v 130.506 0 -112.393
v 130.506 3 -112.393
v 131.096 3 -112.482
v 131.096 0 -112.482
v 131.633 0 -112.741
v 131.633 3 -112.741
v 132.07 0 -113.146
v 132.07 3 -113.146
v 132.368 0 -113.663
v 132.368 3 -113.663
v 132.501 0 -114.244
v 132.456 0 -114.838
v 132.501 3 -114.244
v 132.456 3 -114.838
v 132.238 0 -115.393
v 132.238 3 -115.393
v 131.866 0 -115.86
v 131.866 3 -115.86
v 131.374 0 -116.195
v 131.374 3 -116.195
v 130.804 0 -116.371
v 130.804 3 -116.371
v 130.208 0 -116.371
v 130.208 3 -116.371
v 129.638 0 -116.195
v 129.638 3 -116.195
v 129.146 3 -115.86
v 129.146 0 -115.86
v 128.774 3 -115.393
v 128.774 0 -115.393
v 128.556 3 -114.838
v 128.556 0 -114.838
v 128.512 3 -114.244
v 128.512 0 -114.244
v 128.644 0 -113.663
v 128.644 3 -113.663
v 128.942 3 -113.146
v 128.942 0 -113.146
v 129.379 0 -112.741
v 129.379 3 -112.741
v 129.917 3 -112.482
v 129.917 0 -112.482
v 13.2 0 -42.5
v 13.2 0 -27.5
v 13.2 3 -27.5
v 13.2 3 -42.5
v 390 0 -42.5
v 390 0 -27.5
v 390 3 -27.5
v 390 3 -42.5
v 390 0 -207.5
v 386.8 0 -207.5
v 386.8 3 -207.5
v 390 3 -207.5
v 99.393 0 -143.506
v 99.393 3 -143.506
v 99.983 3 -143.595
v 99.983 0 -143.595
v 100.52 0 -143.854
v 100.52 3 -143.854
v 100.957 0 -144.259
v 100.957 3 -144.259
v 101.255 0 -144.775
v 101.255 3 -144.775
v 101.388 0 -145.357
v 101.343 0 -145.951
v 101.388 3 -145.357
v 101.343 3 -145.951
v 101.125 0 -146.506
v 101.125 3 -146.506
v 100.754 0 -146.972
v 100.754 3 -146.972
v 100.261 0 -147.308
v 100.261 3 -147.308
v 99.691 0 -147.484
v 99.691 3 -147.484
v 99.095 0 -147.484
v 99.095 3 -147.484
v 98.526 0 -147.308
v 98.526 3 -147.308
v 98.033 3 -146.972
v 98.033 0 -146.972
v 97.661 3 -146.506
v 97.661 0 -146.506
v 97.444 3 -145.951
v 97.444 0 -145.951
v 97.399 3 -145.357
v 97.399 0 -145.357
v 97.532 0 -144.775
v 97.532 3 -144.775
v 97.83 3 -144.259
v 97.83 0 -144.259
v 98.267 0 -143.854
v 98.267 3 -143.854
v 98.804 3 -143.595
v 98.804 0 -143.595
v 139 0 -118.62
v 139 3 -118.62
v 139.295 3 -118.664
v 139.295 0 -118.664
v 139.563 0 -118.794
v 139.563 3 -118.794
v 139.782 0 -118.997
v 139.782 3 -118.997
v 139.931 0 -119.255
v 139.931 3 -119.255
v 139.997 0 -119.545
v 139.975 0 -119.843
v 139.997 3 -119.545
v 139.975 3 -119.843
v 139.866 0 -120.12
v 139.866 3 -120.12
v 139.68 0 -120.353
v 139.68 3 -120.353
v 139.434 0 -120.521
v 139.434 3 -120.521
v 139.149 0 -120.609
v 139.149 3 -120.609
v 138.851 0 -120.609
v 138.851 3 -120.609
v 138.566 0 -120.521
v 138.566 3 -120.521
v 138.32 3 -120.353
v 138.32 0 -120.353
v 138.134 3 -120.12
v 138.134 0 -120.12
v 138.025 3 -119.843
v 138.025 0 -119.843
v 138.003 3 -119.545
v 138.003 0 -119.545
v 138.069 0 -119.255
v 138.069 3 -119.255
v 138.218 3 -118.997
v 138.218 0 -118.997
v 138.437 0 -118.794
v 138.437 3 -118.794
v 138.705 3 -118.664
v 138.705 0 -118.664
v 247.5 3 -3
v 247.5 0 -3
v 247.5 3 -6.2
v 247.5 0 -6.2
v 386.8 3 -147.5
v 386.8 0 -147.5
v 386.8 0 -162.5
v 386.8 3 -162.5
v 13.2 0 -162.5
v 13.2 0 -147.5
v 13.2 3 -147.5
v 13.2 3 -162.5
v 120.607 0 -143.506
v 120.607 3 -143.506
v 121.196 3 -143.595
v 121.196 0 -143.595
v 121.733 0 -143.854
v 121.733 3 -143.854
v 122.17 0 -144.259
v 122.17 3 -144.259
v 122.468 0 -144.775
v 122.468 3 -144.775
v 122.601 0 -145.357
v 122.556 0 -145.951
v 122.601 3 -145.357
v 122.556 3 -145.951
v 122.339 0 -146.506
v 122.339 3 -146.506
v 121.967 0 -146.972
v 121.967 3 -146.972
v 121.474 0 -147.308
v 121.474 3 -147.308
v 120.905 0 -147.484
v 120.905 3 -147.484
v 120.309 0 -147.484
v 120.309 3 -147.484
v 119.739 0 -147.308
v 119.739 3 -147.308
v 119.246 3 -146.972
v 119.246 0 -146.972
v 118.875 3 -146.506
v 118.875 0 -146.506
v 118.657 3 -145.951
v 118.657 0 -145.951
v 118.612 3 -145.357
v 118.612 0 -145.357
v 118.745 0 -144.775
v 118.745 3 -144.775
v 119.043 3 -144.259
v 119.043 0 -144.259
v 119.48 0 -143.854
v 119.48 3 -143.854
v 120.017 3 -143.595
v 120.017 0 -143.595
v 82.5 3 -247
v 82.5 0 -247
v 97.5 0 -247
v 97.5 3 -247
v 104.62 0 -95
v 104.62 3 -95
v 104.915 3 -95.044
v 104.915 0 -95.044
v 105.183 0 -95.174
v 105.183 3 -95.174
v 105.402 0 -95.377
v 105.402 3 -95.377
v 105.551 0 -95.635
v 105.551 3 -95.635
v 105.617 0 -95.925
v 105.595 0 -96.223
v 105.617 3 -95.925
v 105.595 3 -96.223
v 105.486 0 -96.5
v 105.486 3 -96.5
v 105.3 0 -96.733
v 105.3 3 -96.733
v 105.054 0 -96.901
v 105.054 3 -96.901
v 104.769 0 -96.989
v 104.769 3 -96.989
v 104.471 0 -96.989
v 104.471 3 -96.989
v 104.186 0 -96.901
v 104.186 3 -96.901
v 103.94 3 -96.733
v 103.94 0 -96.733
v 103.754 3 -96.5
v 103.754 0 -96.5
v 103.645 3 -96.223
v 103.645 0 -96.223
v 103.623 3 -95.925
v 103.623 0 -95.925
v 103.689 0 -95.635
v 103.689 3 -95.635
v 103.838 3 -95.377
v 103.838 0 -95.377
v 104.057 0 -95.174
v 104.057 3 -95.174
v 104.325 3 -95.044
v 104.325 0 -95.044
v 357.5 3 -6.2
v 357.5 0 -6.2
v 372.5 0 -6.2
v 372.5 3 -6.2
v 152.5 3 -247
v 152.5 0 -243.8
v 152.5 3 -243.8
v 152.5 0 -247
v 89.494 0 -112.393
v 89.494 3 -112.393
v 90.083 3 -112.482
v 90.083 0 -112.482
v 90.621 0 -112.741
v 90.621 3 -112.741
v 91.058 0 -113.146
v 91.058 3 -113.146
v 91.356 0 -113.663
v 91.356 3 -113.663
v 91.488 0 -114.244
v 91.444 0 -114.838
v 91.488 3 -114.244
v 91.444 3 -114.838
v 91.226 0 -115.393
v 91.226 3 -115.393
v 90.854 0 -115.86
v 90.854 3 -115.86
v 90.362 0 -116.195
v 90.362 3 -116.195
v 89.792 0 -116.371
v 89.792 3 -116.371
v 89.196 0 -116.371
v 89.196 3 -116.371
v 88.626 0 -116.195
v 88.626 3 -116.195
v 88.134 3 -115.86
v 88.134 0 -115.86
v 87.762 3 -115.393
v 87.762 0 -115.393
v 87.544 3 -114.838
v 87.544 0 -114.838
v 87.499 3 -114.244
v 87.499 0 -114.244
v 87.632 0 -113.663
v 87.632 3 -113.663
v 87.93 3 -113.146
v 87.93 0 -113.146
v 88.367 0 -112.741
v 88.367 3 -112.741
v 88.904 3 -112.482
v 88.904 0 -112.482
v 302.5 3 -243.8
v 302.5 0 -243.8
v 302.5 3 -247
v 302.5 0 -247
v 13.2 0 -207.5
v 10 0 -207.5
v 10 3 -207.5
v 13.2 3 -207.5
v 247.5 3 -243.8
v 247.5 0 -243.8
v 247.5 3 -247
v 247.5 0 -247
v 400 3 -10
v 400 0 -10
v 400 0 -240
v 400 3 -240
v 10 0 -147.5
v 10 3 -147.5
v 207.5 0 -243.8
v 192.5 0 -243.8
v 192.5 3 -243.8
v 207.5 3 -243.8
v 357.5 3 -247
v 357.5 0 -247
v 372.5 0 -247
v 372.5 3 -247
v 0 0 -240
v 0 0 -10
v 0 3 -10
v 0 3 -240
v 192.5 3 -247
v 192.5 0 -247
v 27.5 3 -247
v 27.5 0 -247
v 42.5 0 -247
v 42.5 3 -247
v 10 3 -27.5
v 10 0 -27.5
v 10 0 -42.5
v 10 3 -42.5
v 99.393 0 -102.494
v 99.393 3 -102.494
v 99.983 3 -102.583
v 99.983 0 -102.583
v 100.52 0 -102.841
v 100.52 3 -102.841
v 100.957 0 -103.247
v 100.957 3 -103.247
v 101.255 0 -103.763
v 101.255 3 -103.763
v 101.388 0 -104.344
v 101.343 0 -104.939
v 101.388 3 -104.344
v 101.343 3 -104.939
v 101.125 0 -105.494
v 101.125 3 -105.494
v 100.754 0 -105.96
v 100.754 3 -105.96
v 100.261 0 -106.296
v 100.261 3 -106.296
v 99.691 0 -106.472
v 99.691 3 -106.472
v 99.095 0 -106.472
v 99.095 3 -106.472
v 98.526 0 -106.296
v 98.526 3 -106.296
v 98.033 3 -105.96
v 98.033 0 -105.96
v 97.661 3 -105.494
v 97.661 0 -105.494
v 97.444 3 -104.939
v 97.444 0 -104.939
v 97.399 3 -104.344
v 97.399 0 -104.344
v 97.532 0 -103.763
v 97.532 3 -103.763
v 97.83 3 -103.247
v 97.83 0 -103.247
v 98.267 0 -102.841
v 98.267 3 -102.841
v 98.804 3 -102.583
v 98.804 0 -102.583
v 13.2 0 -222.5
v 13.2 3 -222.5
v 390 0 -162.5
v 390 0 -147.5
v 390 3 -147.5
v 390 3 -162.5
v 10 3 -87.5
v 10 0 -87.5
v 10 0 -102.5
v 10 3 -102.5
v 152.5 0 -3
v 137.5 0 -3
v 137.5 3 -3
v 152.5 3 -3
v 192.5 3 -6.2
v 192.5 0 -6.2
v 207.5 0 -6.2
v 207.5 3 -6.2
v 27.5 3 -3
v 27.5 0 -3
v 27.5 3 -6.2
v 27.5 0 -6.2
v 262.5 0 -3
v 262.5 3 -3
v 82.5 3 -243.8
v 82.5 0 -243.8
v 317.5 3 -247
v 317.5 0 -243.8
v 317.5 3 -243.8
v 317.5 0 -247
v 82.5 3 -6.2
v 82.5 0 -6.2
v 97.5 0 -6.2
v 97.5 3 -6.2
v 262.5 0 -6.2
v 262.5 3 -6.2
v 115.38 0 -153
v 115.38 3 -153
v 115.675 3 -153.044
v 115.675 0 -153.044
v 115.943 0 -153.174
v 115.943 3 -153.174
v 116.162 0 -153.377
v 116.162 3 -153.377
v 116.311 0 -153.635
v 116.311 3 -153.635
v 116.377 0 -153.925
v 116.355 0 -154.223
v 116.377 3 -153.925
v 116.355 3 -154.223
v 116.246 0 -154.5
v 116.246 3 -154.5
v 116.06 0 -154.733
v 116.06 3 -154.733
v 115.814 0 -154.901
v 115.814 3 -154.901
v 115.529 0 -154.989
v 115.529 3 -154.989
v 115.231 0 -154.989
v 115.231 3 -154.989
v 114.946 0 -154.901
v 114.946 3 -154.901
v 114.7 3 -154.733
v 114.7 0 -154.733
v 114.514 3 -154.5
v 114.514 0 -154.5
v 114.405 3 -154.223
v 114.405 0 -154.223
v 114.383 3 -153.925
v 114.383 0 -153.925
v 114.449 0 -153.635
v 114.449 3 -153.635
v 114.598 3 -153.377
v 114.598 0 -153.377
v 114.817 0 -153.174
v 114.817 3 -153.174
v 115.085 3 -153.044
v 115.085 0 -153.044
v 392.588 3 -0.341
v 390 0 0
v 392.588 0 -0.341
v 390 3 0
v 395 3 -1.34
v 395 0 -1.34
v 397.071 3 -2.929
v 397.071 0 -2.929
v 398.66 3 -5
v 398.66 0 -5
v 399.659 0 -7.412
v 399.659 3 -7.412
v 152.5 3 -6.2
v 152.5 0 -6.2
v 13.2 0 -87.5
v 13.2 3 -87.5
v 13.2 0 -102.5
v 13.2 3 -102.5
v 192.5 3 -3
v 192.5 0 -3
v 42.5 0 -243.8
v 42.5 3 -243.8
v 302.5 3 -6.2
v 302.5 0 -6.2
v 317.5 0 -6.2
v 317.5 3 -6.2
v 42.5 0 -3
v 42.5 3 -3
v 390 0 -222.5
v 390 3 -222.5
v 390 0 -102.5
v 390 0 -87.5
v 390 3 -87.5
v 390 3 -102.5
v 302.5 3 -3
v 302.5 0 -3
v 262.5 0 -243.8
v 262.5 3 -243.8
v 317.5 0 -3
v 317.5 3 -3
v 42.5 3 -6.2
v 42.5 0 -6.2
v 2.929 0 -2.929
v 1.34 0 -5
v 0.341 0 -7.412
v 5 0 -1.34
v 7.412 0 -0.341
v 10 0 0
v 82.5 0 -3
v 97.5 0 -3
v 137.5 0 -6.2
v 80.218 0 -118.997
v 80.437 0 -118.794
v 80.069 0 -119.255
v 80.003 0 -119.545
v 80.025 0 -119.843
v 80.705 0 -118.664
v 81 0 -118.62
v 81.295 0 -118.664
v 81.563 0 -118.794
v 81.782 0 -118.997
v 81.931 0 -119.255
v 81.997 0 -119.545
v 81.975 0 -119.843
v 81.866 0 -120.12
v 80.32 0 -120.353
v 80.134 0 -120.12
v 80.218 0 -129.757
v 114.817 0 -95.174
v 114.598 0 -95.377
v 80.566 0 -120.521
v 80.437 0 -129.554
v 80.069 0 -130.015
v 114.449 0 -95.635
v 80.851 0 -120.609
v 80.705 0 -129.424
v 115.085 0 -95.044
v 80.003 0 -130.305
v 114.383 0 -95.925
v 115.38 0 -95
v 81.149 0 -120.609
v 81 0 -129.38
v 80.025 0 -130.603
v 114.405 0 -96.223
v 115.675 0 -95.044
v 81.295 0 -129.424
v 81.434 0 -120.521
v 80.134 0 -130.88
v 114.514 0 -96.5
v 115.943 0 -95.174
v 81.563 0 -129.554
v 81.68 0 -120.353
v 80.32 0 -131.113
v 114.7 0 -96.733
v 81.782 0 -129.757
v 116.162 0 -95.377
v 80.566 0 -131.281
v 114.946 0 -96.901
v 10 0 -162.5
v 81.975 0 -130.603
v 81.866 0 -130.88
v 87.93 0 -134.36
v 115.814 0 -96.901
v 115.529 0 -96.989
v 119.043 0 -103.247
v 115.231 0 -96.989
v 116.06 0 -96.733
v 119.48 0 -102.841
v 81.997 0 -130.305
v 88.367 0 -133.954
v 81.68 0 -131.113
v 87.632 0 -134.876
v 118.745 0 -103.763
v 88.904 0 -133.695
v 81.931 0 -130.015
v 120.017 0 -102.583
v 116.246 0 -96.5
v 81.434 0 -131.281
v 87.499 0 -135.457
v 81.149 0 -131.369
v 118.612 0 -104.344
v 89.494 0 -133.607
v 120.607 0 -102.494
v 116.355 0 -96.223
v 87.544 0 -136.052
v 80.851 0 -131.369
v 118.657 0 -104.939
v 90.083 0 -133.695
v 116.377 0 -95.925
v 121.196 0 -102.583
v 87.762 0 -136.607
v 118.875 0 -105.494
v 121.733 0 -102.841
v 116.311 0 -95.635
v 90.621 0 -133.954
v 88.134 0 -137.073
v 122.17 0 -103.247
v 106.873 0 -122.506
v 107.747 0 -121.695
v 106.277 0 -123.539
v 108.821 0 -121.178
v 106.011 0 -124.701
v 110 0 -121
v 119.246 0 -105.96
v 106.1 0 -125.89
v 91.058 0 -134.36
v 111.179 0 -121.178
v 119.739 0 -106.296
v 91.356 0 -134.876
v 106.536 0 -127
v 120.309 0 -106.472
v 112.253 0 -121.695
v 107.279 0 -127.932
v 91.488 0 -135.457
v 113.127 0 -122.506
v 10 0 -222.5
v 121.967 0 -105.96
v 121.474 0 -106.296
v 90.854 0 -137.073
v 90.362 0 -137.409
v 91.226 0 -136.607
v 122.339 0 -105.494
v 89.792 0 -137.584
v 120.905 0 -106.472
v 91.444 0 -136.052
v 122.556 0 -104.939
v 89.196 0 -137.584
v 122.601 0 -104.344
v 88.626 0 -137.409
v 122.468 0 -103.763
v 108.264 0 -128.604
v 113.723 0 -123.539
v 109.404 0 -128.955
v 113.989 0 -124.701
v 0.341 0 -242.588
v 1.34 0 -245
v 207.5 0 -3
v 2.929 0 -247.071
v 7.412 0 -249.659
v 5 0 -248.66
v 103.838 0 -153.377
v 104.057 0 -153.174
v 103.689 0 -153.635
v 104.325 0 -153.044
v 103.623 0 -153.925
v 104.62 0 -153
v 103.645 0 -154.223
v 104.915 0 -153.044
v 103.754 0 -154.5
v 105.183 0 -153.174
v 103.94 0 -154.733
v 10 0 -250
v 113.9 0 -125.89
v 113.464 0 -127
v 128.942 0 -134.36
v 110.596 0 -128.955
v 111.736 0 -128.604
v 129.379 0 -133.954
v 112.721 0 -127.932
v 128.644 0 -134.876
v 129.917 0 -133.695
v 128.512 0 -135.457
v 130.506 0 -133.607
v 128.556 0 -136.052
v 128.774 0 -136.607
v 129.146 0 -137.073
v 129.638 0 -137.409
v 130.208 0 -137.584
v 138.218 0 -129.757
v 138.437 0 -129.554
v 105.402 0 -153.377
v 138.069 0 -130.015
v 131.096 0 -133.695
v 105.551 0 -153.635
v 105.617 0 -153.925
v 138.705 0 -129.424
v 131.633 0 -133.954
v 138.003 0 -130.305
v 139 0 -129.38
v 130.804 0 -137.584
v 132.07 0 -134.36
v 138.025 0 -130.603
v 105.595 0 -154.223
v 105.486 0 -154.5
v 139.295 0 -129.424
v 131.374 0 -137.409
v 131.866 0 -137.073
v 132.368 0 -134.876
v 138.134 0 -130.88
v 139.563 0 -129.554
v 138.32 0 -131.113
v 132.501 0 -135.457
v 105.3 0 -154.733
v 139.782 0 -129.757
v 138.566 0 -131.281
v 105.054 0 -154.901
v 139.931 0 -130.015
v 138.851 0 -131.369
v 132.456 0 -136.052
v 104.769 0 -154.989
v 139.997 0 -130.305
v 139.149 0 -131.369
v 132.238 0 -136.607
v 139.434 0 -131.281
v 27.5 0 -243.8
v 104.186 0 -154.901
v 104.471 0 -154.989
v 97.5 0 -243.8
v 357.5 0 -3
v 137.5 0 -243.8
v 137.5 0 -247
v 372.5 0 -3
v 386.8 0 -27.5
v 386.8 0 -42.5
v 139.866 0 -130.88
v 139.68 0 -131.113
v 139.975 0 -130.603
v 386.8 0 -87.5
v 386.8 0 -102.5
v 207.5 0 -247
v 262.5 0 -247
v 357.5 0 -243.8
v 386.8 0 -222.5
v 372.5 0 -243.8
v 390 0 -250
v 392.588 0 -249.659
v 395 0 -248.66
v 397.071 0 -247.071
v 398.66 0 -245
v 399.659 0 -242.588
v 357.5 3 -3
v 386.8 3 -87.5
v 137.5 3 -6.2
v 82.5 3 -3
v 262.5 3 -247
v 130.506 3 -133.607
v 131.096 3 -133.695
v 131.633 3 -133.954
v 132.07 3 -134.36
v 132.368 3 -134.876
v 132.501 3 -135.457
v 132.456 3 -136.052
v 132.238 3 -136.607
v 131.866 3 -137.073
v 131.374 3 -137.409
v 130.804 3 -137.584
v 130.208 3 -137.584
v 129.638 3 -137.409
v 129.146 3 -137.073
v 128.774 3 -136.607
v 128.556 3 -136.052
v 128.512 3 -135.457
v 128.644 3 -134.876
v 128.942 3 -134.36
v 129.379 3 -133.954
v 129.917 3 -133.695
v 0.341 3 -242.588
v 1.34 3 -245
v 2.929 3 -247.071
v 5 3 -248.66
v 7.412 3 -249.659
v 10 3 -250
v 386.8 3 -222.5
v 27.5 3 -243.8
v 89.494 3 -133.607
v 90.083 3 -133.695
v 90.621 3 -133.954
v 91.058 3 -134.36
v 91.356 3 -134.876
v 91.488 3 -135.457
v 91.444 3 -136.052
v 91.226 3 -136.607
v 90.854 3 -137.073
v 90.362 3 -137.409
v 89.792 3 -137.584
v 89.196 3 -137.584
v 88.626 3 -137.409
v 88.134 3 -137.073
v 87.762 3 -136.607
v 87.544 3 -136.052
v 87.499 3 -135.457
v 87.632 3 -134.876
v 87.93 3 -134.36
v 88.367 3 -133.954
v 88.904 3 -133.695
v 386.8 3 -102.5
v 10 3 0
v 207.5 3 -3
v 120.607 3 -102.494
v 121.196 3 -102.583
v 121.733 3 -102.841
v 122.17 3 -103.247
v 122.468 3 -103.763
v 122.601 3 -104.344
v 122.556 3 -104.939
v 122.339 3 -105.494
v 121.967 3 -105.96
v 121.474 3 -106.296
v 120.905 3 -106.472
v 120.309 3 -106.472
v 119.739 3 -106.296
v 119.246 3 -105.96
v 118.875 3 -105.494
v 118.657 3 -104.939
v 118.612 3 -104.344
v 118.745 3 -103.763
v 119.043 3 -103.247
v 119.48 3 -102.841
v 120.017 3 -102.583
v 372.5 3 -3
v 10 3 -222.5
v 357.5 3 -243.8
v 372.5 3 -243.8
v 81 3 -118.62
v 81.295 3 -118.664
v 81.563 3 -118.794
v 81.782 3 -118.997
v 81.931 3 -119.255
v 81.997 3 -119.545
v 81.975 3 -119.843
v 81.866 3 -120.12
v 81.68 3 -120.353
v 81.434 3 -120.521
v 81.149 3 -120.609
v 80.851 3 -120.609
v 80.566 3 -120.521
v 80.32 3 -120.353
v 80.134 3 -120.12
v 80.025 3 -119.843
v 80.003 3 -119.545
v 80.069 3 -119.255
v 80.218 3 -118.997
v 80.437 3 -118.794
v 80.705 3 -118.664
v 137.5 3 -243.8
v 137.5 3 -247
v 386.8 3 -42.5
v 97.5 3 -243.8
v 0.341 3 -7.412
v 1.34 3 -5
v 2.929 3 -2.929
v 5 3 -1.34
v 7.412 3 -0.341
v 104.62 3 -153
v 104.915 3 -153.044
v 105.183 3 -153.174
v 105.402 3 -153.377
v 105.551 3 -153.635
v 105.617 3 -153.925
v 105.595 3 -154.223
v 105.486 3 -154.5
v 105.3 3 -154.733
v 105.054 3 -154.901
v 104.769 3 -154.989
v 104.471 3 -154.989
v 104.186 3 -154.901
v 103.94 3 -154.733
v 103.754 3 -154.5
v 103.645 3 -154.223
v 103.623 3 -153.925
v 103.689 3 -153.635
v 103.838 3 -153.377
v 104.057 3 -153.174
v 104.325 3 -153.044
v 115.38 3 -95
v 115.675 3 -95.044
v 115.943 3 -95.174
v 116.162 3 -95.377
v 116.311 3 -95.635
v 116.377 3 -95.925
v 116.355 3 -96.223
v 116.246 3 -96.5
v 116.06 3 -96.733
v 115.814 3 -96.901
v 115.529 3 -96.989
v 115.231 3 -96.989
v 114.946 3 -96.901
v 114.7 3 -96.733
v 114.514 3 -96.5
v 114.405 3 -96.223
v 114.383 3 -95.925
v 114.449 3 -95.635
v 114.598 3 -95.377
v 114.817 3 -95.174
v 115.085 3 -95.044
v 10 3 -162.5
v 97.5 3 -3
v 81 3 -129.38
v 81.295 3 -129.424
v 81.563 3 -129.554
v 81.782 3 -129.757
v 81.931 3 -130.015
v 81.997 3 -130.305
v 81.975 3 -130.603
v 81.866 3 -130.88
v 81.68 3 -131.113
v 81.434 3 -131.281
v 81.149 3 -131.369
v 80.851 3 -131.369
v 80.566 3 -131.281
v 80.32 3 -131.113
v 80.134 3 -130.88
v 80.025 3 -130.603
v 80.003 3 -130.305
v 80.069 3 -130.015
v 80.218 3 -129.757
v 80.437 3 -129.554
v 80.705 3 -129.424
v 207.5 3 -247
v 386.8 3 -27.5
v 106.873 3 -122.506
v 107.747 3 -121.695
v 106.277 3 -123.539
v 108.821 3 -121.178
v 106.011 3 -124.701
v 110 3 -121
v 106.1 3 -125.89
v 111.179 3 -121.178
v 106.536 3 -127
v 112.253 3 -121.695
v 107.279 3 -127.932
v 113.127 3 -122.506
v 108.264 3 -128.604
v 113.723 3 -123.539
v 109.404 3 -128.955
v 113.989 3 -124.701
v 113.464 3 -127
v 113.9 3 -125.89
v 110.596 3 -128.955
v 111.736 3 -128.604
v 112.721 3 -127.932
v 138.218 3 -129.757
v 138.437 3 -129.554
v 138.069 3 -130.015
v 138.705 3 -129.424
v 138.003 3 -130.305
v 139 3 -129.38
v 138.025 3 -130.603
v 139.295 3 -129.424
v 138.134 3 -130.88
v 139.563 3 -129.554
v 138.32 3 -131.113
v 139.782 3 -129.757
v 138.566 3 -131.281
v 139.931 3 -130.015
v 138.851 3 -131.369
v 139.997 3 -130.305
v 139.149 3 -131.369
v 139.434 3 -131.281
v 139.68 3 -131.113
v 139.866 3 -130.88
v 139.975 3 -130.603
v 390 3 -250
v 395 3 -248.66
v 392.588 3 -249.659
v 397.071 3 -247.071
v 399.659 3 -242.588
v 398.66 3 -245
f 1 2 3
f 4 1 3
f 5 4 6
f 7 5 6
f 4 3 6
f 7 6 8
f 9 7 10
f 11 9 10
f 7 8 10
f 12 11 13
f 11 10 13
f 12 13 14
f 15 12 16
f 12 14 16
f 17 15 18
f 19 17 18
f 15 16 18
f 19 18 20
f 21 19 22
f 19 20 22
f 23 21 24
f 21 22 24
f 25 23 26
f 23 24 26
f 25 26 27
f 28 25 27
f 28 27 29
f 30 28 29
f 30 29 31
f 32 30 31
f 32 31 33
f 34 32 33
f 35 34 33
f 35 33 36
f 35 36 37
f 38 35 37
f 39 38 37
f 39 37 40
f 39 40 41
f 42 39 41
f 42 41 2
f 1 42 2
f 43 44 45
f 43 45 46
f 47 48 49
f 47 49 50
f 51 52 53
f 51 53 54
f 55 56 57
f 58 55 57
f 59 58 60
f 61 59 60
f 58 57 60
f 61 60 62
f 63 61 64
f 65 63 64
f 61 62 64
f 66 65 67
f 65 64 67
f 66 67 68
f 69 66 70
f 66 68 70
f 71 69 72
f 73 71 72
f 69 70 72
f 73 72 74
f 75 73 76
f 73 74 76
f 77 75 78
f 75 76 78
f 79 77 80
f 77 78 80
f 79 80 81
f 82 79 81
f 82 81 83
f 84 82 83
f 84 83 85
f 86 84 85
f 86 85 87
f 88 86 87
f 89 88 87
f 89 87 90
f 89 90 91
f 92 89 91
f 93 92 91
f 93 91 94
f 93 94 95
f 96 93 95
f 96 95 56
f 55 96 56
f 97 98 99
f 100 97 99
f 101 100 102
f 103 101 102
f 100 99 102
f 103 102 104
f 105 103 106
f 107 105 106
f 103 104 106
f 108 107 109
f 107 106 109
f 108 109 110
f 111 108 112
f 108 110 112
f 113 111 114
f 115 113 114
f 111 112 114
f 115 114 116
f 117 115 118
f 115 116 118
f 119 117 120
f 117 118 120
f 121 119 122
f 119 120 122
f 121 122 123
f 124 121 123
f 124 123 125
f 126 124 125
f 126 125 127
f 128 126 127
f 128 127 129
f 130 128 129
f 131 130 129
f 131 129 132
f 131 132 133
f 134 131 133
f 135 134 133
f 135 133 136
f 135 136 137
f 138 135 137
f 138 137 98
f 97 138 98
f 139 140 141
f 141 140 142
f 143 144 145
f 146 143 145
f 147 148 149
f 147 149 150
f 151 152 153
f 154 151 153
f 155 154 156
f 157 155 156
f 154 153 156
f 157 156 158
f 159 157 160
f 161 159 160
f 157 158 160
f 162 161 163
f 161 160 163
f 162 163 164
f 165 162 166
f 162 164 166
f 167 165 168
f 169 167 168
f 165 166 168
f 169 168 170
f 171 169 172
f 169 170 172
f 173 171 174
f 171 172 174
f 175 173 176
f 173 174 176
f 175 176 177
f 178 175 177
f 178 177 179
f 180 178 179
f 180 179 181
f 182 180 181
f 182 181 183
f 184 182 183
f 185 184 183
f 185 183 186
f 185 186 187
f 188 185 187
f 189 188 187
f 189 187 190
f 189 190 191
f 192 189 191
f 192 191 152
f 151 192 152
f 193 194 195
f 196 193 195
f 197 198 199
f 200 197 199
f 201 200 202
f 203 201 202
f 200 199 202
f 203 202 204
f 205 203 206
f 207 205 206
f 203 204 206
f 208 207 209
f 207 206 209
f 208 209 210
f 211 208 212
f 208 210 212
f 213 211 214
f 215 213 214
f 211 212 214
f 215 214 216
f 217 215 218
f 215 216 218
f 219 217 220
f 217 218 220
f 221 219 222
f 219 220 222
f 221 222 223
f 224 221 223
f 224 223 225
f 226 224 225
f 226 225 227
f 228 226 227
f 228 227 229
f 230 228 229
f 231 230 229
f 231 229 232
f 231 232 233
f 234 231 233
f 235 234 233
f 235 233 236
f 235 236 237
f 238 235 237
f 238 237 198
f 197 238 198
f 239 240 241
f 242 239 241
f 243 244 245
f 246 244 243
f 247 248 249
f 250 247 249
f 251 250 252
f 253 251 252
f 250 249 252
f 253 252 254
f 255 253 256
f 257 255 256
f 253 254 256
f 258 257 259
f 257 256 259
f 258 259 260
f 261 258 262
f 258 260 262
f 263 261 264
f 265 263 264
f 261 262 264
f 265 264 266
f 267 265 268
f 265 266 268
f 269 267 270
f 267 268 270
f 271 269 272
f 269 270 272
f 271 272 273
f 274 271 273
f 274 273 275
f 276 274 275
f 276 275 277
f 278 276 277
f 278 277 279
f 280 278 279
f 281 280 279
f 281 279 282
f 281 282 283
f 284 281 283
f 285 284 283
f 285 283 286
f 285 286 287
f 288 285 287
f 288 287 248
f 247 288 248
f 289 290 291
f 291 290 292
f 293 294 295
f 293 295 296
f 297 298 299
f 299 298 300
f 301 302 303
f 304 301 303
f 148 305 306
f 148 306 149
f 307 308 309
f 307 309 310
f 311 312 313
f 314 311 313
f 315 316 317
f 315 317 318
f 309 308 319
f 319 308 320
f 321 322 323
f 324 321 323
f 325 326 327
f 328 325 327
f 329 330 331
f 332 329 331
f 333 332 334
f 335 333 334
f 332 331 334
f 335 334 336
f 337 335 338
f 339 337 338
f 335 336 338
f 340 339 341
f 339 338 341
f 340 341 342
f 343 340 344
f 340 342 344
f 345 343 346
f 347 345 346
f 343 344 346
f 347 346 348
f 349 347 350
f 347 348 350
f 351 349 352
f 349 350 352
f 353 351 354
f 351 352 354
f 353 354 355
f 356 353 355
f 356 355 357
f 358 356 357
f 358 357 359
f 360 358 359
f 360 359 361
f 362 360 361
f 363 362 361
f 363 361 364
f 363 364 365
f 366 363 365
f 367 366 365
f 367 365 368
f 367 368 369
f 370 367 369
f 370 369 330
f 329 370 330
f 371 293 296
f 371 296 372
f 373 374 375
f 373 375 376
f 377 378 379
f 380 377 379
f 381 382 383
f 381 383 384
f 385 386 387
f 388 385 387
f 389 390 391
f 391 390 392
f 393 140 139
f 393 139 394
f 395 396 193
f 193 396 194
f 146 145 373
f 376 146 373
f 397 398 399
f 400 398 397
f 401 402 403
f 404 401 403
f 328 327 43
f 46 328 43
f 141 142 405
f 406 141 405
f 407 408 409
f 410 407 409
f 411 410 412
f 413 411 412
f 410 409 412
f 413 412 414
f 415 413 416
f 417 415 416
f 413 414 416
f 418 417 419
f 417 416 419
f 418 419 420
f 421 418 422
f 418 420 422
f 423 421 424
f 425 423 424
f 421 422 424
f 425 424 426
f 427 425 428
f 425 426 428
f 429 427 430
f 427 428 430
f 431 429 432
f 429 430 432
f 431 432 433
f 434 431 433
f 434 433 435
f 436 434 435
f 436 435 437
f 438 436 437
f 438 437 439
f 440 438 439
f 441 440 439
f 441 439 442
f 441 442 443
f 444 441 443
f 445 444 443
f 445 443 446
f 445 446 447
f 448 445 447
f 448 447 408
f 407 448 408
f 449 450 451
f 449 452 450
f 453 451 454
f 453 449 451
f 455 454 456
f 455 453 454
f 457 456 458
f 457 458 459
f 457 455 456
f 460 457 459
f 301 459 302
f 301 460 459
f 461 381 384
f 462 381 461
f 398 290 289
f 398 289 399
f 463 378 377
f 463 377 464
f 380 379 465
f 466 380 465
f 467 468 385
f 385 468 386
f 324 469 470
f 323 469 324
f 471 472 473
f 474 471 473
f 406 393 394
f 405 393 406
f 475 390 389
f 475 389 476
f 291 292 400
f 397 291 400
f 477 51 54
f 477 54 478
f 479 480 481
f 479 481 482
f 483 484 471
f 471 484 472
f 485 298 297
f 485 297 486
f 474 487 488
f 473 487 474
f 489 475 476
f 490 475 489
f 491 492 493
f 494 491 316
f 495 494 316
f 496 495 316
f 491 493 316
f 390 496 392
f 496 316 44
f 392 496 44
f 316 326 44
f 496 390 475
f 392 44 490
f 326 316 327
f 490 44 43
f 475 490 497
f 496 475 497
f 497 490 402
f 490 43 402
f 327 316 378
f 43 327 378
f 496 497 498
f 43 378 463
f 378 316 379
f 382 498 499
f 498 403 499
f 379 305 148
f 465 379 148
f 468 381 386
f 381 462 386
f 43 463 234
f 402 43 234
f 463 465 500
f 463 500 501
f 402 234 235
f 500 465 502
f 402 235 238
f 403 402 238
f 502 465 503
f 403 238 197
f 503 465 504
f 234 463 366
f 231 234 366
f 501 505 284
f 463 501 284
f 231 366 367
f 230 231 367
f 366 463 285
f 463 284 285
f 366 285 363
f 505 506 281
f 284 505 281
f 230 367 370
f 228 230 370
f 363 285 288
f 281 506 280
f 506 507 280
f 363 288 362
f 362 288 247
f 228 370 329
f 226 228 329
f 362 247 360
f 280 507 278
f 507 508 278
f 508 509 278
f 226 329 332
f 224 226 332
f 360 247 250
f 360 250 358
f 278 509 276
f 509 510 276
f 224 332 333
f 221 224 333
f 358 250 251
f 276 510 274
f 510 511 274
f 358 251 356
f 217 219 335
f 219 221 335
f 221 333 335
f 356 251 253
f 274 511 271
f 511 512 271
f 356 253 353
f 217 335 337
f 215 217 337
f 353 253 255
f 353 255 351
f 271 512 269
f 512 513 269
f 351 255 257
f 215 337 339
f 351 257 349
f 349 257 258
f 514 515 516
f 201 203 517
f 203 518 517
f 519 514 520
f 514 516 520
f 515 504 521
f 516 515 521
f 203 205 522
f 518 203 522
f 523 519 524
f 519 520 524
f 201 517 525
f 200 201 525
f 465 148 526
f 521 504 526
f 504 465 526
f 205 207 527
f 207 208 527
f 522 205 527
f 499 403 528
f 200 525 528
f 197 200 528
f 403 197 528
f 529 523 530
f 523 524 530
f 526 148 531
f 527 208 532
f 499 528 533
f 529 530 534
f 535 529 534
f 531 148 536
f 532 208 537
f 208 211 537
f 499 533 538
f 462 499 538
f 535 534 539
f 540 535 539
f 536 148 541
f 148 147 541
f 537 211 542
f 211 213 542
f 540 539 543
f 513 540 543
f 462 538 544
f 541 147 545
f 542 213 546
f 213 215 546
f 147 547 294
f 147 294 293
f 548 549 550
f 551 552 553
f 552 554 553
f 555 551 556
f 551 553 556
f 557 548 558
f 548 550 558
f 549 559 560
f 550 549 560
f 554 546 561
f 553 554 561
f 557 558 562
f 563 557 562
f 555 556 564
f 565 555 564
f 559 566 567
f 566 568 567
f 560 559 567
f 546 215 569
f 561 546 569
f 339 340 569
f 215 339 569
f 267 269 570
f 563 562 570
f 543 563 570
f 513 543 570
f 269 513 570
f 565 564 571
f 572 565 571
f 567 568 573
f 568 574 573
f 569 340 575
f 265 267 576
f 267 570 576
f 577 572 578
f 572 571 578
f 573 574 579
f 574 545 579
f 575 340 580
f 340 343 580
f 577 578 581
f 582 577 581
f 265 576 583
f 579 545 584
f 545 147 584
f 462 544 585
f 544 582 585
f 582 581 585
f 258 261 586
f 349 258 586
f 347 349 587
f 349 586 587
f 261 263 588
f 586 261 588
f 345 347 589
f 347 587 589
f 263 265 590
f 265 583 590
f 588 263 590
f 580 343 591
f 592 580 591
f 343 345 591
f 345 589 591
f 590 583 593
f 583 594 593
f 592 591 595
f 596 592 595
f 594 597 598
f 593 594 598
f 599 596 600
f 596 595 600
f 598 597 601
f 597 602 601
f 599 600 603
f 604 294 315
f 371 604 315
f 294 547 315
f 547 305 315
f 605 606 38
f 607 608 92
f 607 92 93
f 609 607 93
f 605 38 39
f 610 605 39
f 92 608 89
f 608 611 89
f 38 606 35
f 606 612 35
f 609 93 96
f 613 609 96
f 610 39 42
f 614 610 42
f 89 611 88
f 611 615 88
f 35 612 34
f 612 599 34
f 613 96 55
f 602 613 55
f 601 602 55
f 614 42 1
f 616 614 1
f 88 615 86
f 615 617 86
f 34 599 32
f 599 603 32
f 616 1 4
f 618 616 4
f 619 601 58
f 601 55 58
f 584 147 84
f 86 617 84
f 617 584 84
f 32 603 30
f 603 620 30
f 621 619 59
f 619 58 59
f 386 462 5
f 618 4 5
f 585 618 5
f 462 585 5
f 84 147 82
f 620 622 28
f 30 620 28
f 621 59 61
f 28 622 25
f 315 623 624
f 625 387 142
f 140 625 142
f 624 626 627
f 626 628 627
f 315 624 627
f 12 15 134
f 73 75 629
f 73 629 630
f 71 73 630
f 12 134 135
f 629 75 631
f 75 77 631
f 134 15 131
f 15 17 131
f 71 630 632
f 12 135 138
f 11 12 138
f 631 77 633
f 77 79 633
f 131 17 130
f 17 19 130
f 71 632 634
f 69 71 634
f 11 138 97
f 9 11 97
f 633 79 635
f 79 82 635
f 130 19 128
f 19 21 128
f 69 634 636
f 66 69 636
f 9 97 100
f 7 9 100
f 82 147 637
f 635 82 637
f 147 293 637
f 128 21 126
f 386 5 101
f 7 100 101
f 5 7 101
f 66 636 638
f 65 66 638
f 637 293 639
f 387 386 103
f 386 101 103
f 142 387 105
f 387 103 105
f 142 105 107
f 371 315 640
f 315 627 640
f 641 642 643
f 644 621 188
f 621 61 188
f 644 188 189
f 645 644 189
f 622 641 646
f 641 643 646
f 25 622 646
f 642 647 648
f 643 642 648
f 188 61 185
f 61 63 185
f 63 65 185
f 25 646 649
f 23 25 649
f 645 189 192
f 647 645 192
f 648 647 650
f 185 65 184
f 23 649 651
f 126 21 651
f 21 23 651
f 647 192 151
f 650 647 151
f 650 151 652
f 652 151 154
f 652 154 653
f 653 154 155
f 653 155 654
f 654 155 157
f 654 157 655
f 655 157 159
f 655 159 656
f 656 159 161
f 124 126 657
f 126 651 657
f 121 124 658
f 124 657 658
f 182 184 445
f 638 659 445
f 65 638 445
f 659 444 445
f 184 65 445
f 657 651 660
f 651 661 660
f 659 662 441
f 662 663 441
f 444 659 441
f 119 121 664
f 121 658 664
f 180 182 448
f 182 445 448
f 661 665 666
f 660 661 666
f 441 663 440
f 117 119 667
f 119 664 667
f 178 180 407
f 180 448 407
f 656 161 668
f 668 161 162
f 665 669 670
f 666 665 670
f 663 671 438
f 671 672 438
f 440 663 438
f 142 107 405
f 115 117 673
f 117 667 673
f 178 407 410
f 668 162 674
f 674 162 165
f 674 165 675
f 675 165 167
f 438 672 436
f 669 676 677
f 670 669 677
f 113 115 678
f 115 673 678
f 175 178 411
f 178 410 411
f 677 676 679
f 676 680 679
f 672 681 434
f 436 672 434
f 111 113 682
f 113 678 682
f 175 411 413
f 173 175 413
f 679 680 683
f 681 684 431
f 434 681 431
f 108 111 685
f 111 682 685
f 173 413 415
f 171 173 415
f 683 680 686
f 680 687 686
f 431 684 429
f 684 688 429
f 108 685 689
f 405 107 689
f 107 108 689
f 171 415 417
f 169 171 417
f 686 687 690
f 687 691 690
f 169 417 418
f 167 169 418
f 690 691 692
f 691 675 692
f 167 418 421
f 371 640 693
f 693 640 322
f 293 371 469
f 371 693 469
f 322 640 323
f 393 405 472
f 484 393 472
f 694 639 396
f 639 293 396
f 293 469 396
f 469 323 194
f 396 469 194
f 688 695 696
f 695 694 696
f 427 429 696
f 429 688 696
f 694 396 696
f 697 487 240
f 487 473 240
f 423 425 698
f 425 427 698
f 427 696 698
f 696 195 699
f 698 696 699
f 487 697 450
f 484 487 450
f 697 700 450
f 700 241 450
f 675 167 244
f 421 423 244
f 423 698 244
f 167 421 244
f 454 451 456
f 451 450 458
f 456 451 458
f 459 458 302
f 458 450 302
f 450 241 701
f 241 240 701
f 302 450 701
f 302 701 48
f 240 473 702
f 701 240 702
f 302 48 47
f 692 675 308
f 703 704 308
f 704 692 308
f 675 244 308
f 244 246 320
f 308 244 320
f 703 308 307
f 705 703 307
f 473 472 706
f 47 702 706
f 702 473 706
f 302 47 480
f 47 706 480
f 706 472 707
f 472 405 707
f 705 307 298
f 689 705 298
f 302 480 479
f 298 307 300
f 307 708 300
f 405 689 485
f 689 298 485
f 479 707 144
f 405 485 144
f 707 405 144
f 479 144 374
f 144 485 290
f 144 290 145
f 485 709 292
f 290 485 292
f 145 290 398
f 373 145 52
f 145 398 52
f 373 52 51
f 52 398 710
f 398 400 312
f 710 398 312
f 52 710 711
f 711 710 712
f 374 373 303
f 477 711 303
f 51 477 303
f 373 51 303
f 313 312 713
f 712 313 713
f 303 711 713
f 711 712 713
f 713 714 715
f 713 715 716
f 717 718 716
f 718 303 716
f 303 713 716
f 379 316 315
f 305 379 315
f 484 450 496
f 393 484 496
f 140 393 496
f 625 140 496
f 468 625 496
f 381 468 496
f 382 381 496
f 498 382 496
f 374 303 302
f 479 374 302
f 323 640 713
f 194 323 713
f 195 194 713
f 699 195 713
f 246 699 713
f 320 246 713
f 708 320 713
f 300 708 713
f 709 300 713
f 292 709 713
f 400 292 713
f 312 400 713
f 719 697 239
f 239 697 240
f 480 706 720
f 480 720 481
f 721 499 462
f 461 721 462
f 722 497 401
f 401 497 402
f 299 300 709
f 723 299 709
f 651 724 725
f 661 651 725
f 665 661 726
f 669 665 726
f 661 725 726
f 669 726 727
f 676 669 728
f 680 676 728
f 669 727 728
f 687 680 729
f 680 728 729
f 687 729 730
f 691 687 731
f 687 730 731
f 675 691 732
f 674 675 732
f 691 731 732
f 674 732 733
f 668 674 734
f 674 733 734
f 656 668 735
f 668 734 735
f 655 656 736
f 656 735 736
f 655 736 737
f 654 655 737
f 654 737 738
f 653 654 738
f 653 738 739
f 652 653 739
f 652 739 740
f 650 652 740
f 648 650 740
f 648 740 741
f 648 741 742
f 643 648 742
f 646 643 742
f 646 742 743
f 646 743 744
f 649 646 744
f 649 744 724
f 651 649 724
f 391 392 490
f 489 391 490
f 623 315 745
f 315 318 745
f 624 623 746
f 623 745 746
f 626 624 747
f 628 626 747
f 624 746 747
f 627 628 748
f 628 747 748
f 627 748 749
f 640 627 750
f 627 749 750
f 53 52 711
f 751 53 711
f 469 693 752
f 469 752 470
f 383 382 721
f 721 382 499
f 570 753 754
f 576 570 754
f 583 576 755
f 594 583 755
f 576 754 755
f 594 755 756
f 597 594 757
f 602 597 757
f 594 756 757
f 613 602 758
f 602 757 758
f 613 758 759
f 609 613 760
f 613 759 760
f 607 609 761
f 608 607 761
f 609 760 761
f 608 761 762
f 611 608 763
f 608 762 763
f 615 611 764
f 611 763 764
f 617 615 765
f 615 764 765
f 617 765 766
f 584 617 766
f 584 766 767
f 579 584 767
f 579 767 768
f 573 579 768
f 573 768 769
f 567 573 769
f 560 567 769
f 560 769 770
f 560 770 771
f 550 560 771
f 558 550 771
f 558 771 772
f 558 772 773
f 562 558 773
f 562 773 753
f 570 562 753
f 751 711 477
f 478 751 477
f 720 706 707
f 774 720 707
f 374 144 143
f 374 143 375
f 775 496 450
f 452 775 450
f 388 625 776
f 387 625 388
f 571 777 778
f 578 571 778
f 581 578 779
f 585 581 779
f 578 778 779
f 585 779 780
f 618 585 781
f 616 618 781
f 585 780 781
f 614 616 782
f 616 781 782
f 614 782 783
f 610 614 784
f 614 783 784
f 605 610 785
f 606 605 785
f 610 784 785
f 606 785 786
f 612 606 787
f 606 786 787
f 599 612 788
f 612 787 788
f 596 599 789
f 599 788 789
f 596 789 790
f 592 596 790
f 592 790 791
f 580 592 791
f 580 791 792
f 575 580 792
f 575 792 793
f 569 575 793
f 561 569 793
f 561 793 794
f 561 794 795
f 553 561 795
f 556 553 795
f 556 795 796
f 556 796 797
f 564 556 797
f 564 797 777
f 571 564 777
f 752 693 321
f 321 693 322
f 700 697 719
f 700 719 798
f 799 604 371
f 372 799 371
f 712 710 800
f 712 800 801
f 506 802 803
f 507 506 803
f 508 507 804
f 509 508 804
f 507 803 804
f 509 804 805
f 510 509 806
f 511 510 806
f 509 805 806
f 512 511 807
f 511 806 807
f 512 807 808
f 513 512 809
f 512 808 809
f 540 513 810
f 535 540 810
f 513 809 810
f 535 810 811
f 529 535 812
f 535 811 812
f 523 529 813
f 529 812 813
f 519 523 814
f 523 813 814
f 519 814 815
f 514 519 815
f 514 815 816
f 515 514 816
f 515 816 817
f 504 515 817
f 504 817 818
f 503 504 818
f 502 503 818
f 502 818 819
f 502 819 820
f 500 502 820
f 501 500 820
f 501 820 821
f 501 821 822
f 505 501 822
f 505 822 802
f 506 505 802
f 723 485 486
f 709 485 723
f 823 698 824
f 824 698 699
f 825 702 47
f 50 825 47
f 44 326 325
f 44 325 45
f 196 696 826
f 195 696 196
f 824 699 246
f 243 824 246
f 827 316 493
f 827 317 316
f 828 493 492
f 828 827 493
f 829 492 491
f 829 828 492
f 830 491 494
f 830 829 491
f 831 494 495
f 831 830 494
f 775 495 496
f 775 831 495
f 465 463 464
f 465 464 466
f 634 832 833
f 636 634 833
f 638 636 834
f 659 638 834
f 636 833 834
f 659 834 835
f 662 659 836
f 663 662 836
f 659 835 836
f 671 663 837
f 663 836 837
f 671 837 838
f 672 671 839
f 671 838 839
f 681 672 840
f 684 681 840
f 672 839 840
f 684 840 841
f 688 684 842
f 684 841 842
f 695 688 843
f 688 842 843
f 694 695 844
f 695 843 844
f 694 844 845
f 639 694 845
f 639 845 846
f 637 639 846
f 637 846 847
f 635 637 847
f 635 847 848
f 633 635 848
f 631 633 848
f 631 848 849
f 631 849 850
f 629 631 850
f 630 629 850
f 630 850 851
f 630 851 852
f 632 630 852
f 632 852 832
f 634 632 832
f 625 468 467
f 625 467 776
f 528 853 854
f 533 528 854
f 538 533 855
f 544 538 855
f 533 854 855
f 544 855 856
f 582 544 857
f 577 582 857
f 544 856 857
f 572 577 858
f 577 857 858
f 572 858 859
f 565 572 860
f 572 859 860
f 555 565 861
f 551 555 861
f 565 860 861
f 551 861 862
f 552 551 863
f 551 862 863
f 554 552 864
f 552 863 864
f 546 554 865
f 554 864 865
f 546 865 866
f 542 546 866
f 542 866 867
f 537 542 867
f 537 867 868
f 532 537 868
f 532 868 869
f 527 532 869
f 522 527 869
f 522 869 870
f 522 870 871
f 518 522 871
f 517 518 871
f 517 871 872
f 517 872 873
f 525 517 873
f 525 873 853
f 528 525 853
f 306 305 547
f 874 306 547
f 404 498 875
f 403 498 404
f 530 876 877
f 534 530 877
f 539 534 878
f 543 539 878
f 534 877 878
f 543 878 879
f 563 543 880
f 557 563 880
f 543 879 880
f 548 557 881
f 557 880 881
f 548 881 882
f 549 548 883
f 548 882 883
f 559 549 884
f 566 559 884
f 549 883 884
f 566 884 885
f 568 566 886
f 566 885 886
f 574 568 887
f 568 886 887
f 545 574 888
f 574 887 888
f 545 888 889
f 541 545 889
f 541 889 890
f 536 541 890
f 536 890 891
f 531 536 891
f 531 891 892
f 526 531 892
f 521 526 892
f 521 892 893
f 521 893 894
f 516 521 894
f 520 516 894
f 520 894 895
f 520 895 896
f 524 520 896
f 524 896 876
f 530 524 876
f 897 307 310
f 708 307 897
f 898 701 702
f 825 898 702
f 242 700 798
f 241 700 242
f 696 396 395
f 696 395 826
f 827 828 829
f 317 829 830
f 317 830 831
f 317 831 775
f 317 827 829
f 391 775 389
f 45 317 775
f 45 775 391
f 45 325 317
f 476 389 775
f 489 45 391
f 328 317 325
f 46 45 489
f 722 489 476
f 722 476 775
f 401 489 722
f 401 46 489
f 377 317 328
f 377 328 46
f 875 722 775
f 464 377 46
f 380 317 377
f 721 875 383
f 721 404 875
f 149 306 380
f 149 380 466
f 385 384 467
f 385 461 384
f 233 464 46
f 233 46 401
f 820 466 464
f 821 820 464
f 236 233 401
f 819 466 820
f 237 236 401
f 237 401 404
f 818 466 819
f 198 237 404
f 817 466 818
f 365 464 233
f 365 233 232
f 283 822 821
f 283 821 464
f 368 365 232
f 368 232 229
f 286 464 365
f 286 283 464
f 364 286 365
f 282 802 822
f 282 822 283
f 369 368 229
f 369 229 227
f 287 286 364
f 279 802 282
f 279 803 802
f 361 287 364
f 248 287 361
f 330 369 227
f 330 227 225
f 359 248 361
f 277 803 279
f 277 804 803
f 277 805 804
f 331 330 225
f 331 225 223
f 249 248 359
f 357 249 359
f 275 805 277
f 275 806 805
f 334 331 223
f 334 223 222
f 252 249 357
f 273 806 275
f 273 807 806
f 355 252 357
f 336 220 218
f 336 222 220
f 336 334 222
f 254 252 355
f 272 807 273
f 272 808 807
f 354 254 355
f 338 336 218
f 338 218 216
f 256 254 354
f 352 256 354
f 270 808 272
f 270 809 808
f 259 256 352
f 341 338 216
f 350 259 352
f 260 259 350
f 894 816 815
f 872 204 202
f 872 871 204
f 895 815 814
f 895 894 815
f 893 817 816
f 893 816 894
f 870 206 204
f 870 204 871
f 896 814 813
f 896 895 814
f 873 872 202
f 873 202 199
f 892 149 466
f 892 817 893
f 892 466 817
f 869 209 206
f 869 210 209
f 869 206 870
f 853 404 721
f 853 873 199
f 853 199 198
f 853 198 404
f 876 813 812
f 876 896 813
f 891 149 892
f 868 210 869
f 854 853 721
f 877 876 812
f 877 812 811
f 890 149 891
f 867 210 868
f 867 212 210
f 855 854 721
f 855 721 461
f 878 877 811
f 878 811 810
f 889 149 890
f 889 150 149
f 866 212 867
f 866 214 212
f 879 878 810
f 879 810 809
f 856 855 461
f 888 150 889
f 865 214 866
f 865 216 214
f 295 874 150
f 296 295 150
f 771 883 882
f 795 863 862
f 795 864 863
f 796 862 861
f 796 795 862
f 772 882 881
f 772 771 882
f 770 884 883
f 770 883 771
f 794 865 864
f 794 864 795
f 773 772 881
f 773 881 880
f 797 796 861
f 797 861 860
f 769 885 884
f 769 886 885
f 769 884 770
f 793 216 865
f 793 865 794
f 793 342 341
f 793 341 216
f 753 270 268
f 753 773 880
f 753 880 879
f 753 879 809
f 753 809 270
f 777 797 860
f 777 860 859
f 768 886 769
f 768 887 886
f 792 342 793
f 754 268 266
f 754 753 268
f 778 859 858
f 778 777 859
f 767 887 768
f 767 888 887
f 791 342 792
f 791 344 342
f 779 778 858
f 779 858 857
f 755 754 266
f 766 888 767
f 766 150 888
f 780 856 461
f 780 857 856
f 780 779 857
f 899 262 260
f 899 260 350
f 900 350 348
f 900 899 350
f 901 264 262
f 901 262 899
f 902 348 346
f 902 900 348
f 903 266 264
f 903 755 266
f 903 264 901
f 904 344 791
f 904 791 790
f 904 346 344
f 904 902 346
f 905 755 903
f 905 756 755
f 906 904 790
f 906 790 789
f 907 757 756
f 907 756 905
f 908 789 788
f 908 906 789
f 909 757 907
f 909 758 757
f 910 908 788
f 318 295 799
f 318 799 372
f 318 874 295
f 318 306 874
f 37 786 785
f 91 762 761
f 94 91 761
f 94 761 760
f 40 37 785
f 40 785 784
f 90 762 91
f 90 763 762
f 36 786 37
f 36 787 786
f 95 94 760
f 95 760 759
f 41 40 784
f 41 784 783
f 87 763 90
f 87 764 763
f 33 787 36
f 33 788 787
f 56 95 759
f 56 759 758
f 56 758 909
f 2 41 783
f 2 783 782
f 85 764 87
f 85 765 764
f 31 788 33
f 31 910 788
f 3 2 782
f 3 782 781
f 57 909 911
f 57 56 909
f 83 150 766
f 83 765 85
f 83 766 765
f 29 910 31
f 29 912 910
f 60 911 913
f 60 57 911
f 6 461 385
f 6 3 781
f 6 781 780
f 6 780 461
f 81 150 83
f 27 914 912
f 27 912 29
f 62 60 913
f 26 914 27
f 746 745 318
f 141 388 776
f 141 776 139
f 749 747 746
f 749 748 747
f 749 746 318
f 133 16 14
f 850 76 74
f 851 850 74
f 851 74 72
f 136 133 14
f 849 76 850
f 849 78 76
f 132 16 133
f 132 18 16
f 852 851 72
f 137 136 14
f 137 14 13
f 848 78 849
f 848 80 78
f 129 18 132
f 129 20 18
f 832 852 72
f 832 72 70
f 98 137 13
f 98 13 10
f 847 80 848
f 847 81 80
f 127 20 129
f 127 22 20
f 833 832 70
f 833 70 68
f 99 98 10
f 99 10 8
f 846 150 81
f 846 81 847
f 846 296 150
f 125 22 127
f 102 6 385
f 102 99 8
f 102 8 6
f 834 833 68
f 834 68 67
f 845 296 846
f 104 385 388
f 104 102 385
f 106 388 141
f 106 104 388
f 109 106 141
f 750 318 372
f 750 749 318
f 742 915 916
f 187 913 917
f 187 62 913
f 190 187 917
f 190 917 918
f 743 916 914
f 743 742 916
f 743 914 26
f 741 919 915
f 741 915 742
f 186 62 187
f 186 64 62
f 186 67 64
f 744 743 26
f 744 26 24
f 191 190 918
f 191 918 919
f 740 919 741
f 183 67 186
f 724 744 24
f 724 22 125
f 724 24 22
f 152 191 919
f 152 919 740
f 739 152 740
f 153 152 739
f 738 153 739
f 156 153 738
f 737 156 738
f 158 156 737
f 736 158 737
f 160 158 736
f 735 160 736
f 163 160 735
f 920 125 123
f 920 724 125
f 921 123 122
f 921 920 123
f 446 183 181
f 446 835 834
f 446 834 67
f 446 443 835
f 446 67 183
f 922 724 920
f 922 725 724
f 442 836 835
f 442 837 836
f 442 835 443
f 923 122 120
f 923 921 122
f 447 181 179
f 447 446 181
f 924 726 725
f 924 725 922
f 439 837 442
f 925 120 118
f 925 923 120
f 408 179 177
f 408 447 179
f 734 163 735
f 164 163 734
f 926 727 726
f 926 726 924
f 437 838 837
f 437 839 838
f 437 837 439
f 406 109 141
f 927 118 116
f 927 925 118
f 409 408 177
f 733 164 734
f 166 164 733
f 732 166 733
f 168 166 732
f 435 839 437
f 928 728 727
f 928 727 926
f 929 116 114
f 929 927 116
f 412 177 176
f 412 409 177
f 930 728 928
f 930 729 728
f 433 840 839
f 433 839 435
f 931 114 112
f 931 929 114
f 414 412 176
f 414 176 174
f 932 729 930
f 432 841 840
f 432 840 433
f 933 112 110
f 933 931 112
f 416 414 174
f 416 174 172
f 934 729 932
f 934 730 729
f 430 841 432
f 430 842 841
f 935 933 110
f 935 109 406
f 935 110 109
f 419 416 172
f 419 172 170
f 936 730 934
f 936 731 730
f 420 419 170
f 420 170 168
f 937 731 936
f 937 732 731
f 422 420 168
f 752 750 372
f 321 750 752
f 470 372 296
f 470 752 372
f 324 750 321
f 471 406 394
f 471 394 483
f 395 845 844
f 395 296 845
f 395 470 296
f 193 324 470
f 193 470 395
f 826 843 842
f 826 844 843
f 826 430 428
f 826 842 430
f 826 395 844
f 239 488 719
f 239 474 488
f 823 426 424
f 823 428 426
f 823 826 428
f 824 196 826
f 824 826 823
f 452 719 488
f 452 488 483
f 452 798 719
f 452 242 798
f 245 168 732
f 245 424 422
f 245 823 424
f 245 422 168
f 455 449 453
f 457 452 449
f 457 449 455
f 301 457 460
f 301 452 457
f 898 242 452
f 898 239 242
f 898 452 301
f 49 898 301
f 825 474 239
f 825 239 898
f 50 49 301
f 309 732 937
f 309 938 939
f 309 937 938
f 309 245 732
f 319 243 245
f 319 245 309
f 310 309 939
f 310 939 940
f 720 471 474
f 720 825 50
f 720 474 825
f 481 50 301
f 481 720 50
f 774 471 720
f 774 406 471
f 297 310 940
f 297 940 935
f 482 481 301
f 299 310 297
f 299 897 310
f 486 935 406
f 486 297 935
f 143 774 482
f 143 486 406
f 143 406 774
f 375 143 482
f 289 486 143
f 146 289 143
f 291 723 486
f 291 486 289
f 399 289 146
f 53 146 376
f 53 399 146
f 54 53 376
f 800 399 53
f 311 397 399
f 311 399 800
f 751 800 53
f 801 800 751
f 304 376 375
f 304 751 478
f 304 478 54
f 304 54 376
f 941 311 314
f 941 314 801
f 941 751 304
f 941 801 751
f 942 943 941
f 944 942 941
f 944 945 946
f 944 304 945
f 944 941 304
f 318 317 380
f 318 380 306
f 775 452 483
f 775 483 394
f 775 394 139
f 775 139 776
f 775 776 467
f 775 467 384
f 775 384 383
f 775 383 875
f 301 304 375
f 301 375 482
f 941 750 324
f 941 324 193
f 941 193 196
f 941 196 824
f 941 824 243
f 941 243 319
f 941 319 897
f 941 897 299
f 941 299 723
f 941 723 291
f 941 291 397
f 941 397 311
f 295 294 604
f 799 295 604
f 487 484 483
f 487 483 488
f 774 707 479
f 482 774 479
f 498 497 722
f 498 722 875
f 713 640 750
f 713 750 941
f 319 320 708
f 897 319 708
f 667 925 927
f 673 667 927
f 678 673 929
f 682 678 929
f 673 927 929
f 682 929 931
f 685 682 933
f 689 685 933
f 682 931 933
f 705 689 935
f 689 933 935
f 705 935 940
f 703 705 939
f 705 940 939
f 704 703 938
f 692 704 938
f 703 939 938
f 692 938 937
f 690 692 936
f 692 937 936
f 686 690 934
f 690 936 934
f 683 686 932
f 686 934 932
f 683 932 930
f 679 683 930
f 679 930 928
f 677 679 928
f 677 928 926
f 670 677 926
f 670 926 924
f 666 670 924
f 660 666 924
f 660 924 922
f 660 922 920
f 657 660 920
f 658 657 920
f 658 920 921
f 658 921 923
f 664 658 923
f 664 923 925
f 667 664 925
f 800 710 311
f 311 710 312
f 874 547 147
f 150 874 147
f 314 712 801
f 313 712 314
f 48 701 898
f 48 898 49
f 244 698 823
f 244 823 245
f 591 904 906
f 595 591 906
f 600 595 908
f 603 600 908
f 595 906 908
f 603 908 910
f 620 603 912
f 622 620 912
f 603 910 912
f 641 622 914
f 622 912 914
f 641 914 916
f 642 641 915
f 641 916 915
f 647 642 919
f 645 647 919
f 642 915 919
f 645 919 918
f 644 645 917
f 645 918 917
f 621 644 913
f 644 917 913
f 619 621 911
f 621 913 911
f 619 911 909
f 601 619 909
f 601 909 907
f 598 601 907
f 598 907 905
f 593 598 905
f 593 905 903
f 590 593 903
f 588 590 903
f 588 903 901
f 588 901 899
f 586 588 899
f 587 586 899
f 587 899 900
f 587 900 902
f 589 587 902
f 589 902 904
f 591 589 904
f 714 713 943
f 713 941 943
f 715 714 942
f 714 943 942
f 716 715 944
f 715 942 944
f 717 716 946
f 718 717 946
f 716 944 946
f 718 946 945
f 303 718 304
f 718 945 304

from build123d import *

# Parameters (mm, degrees)
SKETCH1_W           = 400
SKETCH1_H           = 250
SKETCH1_W_2         = 15
SKETCH1_H_2         = 3.2
SKETCH1_W_3         = 3.2
SKETCH1_H_3         = 15
BOSS_EXTRUDE2_DEPTH = 3
FILLET1_R           = 10
SKETCH2_R           = 2
SKETCH2_R_2         = 1
SKETCH2_R_3         = 4
CUT_EXTRUDE1_DEPTH  = 472.708596487


with BuildPart() as part:
    # Sketch1 → Boss-Extrude2 (new body)
    with BuildSketch(Plane(origin=(0, 0, 0), x_dir=(1, 0, 0), z_dir=(0, 1, 0))):
        with Locations((200, 125)):
            Rectangle(SKETCH1_W, SKETCH1_H)
        with Locations((90, 4.6)):
            Rectangle(SKETCH1_W_2, SKETCH1_H_2, mode=Mode.SUBTRACT)
        with Locations((35, 4.6)):
            Rectangle(SKETCH1_W_2, SKETCH1_H_2, mode=Mode.SUBTRACT)
        with Locations((145, 4.6)):
            Rectangle(SKETCH1_W_2, SKETCH1_H_2, mode=Mode.SUBTRACT)
        with Locations((200, 4.6)):
            Rectangle(SKETCH1_W_2, SKETCH1_H_2, mode=Mode.SUBTRACT)
        with Locations((255, 4.6)):
            Rectangle(SKETCH1_W_2, SKETCH1_H_2, mode=Mode.SUBTRACT)
        with Locations((310, 4.6)):
            Rectangle(SKETCH1_W_2, SKETCH1_H_2, mode=Mode.SUBTRACT)
        with Locations((365, 4.6)):
            Rectangle(SKETCH1_W_2, SKETCH1_H_2, mode=Mode.SUBTRACT)
        with Locations((365, 245.4)):
            Rectangle(SKETCH1_W_2, SKETCH1_H_2, mode=Mode.SUBTRACT)
        with Locations((310, 245.4)):
            Rectangle(SKETCH1_W_2, SKETCH1_H_2, mode=Mode.SUBTRACT)
        with Locations((255, 245.4)):
            Rectangle(SKETCH1_W_2, SKETCH1_H_2, mode=Mode.SUBTRACT)
        with Locations((200, 245.4)):
            Rectangle(SKETCH1_W_2, SKETCH1_H_2, mode=Mode.SUBTRACT)
        with Locations((35, 245.4)):
            Rectangle(SKETCH1_W_2, SKETCH1_H_2, mode=Mode.SUBTRACT)
        with Locations((90, 245.4)):
            Rectangle(SKETCH1_W_2, SKETCH1_H_2, mode=Mode.SUBTRACT)
        with Locations((145, 245.4)):
            Rectangle(SKETCH1_W_2, SKETCH1_H_2, mode=Mode.SUBTRACT)
        with Locations((11.6, 95)):
            Rectangle(SKETCH1_W_3, SKETCH1_H_3, mode=Mode.SUBTRACT)
        with Locations((11.6, 35)):
            Rectangle(SKETCH1_W_3, SKETCH1_H_3, mode=Mode.SUBTRACT)
        with Locations((11.6, 155)):
            Rectangle(SKETCH1_W_3, SKETCH1_H_3, mode=Mode.SUBTRACT)
        with Locations((11.6, 215)):
            Rectangle(SKETCH1_W_3, SKETCH1_H_3, mode=Mode.SUBTRACT)
        with Locations((388.4, 35)):
            Rectangle(SKETCH1_W_3, SKETCH1_H_3, mode=Mode.SUBTRACT)
        with Locations((388.4, 95)):
            Rectangle(SKETCH1_W_3, SKETCH1_H_3, mode=Mode.SUBTRACT)
        with Locations((388.4, 155)):
            Rectangle(SKETCH1_W_3, SKETCH1_H_3, mode=Mode.SUBTRACT)
        with Locations((388.4, 215)):
            Rectangle(SKETCH1_W_3, SKETCH1_H_3, mode=Mode.SUBTRACT)
    extrude(amount=BOSS_EXTRUDE2_DEPTH)

    # Fillet1
    fillet1_edges = [part.edges().sort_by_distance(p)[0] for p in [
        (0, 1.5, -250),
        (400, 1.5, -250),
        (400, 1.5, 0),
        (0, 1.5, 0),
    ]]
    fillet(fillet1_edges, radius=FILLET1_R)

    # Sketch2 → Cut-Extrude1 (cut, through all)
    with BuildSketch(Plane(origin=(0, 3, 0), x_dir=(1, 0, 0), z_dir=(0, 1, 0))):
        with Locations(Location((89.493903346, 135.606601718, 0), (0, 0, 270))):
            Circle(SKETCH2_R)
        with Locations(Location((120.606601718, 145.506096654, 0), (0, 0, 270))):
            Circle(SKETCH2_R)
        with Locations(Location((130.506096654, 135.606601718, 0), (0, 0, 270))):
            Circle(SKETCH2_R)
        with Locations(Location((99.393398282, 104.493903346, 0), (0, 0, 270))):
            Circle(SKETCH2_R)
        with Locations(Location((120.606601718, 104.493903346, 0), (0, 0, 270))):
            Circle(SKETCH2_R)
        with Locations(Location((89.493903346, 114.393398282, 0), (0, 0, 270))):
            Circle(SKETCH2_R)
        with Locations(Location((81, 119.62, 0), (0, 0, 270))):
            Circle(SKETCH2_R_2)
        with Locations(Location((110, 125, 0), (0, 0, 270))):
            Circle(SKETCH2_R_3)
        with Locations(Location((81, 130.38, 0), (0, 0, 270))):
            Circle(SKETCH2_R_2)
        with Locations(Location((99.393398282, 145.506096654, 0), (0, 0, 270))):
            Circle(SKETCH2_R)
        with Locations(Location((104.62, 154, 0), (0, 0, 270))):
            Circle(SKETCH2_R_2)
        with Locations(Location((115.38, 154, 0), (0, 0, 270))):
            Circle(SKETCH2_R_2)
        with Locations(Location((139, 130.38, 0), (0, 0, 270))):
            Circle(SKETCH2_R_2)
        with Locations(Location((139, 119.62, 0), (0, 0, 270))):
            Circle(SKETCH2_R_2)
        with Locations(Location((130.506096654, 114.393398282, 0), (0, 0, 270))):
            Circle(SKETCH2_R)
        with Locations(Location((115.38, 96, 0), (0, 0, 270))):
            Circle(SKETCH2_R_2)
        with Locations(Location((104.62, 96, 0), (0, 0, 270))):
            Circle(SKETCH2_R_2)
    extrude(amount=-CUT_EXTRUDE1_DEPTH, mode=Mode.SUBTRACT)


solid = part.part
